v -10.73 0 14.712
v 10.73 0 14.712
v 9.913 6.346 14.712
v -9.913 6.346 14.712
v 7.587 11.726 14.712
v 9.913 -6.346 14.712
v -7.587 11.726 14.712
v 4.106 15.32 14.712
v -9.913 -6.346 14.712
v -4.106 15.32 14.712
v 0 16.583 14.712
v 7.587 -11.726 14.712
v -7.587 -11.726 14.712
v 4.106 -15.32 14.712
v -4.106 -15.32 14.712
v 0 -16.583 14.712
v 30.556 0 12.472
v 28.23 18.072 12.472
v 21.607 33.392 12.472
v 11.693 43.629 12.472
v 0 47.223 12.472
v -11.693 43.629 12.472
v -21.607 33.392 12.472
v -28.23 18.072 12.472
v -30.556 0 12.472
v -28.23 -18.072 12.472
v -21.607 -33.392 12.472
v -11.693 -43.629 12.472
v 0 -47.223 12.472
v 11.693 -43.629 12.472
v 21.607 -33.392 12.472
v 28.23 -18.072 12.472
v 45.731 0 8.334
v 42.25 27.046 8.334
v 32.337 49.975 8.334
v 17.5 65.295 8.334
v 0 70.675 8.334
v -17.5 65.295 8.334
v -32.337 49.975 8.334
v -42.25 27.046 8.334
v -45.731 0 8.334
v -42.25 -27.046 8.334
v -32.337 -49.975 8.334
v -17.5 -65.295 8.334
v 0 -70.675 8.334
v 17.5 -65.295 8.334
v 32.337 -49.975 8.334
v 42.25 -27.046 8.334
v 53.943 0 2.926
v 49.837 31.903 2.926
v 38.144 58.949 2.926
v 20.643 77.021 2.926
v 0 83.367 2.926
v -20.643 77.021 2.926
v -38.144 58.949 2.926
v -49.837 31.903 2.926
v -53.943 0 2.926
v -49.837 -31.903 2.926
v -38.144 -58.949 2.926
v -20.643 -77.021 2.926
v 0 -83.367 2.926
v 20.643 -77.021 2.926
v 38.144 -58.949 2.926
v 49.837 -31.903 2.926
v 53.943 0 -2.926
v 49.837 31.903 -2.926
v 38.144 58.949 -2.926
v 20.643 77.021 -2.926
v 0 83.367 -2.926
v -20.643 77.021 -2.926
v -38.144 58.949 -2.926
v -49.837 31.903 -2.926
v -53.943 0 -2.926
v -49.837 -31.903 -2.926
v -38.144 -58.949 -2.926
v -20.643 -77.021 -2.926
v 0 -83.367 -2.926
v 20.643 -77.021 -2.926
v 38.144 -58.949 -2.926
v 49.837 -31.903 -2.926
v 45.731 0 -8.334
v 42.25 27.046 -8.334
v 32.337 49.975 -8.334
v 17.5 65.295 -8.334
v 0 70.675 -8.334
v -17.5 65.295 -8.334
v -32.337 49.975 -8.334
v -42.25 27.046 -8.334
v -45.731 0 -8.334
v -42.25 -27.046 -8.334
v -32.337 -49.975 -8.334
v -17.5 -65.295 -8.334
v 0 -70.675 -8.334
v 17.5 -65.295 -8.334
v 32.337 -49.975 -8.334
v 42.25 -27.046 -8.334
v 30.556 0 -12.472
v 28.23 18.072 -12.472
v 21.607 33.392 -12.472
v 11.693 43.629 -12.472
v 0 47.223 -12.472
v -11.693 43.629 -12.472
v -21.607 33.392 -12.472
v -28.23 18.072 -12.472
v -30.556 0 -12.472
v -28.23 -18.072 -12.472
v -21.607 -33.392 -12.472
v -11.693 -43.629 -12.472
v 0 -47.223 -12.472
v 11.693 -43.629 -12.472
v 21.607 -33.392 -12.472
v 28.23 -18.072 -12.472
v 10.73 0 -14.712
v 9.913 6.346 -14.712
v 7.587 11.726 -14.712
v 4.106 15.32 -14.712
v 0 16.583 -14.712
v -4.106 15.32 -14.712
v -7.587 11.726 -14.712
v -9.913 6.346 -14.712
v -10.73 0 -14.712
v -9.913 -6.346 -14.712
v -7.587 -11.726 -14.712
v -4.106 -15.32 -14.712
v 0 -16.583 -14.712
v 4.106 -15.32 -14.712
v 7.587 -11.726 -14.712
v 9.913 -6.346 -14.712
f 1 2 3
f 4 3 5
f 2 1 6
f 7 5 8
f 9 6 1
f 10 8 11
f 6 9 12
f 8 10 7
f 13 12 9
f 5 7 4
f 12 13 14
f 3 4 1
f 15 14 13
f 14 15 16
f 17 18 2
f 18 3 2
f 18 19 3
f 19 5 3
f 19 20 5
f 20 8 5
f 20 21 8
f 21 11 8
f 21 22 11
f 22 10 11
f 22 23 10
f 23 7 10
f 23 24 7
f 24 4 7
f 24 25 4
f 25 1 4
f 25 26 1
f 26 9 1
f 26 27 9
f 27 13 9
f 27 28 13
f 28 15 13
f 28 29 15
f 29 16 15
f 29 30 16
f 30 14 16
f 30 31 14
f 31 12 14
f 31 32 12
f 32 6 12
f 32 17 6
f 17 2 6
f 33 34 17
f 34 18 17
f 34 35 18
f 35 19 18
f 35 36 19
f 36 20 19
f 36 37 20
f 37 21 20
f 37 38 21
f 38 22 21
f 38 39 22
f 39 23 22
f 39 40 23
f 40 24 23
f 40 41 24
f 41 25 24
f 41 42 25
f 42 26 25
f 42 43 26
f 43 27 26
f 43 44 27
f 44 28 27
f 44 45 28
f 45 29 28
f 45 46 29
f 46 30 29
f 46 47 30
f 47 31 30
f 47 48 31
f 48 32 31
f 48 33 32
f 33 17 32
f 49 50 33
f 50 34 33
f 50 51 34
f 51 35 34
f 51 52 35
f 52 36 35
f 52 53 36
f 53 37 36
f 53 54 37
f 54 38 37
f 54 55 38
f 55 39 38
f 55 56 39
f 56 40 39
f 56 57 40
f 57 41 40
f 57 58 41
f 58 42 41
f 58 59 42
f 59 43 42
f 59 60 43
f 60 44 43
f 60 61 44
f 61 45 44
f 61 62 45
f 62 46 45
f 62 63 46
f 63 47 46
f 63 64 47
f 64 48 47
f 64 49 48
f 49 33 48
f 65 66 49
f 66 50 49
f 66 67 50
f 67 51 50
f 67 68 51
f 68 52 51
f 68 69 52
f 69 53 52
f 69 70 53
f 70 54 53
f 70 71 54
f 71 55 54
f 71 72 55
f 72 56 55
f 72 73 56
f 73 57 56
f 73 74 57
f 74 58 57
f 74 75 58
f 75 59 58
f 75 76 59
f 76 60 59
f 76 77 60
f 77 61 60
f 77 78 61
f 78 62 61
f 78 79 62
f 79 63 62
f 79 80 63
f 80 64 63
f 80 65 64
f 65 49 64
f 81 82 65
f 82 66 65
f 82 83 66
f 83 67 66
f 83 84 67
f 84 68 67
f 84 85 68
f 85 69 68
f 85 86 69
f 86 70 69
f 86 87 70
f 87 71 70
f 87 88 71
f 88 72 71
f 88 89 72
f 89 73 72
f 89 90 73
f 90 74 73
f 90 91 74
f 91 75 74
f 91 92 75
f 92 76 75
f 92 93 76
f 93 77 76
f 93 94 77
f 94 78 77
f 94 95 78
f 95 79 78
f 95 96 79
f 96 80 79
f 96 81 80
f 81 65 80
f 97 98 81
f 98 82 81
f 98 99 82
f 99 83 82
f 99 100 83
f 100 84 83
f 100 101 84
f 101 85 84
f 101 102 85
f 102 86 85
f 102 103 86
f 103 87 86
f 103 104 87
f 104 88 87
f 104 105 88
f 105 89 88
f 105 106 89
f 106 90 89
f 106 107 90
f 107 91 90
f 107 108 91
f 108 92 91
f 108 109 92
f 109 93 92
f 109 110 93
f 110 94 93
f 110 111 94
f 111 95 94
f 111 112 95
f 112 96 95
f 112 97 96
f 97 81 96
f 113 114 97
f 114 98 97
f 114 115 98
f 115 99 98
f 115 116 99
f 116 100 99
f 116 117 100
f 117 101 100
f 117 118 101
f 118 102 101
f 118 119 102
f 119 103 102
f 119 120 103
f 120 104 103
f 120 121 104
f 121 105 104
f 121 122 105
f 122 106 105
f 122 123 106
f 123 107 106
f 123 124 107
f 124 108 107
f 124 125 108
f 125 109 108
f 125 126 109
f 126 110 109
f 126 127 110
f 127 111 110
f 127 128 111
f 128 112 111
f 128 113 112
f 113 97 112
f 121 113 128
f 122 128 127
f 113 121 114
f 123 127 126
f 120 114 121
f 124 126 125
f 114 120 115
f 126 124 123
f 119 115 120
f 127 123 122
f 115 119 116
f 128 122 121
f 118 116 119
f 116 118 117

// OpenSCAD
// Generated by SolidPython 1.0.1 on 2020-07-29 00:46:50


scale(v = [11, 17, 3]) {
	sphere(r = 5);
}
/***********************************************
*********      SolidPython code:      **********
************************************************
 
# import packages: SolidPython
from solid import *
from solid.utils import *
from itertools import chain, combinations, permutations


class Resize:

    def __init__(self, scad_file):
        self.scad_file = scad_file
        #self.scad_file = import_scad(scad_file)
        # cone/cylinder param:
        self.r1 = 0
        self.r2 = 0
        self.h = 0
        # rectangular prism param:
        self.w = 0
        self.l = 0
        # ellipse param:
        self.r = 0

    # import OpenScad code (file name corresponds to shape)


    # classify shape + parameters
    def assign(self, param1, param2, param3):
        if self.scad_file == 'cone.scad':
            self.r1 = param1
            self.r2 = param2
            self.h = param3
        elif self.scad_file == 'cylinder.scad':
            self.r1 = param1
            self.r2 = param2
            self.h = param3
        elif self.scad_file == 'rectangularPrism.scad':
            self.h = param1
            self.l = param2
            self.w = param3
        else:
            self.r = param1
            self.h = param2

    # resize parameters
    def iterate(self):
        x = range(3, 20, 2)
        i = 1
        if self.scad_file == 'cone.scad':
            tempList = list(permutations(x, 2))
            for temp in tempList:
                param1 = temp[0]
                param2 = temp[1]
                filepath = 'produced_scad_files/' + 'cone' + str(param1) + '_' + str(param2) + '_' + '.scad'
                scad_render_to_file(cylinder(h=param1, r1=param2, r2=0), filepath)

        elif self.scad_file == 'cylinder.scad':
            tempList = list(permutations(x, 3))
            for temp in tempList:
                param1 = temp[0]
                param2 = temp[1]
                filepath = 'produced_scad_files/' + 'cylinder' + str(param1) + '_' + str(param2) + '_' + '.scad'
                scad_render_to_file(cylinder(h=param1, r1=param2, r2=param2), filepath)

        elif self.scad_file == 'rectangularPrism.scad':
            tempList = list(permutations(x, 3))
            for temp in tempList:
                param1 = temp[0]
                param2 = temp[1]
                param3 = temp[2]
                filepath = 'produced_scad_files/' + 'rectangularPrism' + str(param1) + '_' + str(param2) + '_' + str(
                    param3) + '.scad'
                scad_render_to_file(cube(size=(param1, param2, param3)), filepath)

        elif self.scad_file == 'ellipse.scad':
            tempList = list(permutations(x, 4))
            for temp in tempList:
                param1 = temp[0]
                param2 = temp[1]
                param3 = temp[2]
                param4 = temp[3]
                filepath = 'produced_scad_files/' + 'ellipse' + str(param1) + '_' + str(param2) + '_' + str(param3) + '_' + str(param4) + '.scad'
                scad_render_to_file(scale([param1, param2, param3])(sphere(r=param4)), filepath)

    def render_to_scadfile(self):
        scad_render_to_file(scad, 'example.scad') 
 
************************************************/
